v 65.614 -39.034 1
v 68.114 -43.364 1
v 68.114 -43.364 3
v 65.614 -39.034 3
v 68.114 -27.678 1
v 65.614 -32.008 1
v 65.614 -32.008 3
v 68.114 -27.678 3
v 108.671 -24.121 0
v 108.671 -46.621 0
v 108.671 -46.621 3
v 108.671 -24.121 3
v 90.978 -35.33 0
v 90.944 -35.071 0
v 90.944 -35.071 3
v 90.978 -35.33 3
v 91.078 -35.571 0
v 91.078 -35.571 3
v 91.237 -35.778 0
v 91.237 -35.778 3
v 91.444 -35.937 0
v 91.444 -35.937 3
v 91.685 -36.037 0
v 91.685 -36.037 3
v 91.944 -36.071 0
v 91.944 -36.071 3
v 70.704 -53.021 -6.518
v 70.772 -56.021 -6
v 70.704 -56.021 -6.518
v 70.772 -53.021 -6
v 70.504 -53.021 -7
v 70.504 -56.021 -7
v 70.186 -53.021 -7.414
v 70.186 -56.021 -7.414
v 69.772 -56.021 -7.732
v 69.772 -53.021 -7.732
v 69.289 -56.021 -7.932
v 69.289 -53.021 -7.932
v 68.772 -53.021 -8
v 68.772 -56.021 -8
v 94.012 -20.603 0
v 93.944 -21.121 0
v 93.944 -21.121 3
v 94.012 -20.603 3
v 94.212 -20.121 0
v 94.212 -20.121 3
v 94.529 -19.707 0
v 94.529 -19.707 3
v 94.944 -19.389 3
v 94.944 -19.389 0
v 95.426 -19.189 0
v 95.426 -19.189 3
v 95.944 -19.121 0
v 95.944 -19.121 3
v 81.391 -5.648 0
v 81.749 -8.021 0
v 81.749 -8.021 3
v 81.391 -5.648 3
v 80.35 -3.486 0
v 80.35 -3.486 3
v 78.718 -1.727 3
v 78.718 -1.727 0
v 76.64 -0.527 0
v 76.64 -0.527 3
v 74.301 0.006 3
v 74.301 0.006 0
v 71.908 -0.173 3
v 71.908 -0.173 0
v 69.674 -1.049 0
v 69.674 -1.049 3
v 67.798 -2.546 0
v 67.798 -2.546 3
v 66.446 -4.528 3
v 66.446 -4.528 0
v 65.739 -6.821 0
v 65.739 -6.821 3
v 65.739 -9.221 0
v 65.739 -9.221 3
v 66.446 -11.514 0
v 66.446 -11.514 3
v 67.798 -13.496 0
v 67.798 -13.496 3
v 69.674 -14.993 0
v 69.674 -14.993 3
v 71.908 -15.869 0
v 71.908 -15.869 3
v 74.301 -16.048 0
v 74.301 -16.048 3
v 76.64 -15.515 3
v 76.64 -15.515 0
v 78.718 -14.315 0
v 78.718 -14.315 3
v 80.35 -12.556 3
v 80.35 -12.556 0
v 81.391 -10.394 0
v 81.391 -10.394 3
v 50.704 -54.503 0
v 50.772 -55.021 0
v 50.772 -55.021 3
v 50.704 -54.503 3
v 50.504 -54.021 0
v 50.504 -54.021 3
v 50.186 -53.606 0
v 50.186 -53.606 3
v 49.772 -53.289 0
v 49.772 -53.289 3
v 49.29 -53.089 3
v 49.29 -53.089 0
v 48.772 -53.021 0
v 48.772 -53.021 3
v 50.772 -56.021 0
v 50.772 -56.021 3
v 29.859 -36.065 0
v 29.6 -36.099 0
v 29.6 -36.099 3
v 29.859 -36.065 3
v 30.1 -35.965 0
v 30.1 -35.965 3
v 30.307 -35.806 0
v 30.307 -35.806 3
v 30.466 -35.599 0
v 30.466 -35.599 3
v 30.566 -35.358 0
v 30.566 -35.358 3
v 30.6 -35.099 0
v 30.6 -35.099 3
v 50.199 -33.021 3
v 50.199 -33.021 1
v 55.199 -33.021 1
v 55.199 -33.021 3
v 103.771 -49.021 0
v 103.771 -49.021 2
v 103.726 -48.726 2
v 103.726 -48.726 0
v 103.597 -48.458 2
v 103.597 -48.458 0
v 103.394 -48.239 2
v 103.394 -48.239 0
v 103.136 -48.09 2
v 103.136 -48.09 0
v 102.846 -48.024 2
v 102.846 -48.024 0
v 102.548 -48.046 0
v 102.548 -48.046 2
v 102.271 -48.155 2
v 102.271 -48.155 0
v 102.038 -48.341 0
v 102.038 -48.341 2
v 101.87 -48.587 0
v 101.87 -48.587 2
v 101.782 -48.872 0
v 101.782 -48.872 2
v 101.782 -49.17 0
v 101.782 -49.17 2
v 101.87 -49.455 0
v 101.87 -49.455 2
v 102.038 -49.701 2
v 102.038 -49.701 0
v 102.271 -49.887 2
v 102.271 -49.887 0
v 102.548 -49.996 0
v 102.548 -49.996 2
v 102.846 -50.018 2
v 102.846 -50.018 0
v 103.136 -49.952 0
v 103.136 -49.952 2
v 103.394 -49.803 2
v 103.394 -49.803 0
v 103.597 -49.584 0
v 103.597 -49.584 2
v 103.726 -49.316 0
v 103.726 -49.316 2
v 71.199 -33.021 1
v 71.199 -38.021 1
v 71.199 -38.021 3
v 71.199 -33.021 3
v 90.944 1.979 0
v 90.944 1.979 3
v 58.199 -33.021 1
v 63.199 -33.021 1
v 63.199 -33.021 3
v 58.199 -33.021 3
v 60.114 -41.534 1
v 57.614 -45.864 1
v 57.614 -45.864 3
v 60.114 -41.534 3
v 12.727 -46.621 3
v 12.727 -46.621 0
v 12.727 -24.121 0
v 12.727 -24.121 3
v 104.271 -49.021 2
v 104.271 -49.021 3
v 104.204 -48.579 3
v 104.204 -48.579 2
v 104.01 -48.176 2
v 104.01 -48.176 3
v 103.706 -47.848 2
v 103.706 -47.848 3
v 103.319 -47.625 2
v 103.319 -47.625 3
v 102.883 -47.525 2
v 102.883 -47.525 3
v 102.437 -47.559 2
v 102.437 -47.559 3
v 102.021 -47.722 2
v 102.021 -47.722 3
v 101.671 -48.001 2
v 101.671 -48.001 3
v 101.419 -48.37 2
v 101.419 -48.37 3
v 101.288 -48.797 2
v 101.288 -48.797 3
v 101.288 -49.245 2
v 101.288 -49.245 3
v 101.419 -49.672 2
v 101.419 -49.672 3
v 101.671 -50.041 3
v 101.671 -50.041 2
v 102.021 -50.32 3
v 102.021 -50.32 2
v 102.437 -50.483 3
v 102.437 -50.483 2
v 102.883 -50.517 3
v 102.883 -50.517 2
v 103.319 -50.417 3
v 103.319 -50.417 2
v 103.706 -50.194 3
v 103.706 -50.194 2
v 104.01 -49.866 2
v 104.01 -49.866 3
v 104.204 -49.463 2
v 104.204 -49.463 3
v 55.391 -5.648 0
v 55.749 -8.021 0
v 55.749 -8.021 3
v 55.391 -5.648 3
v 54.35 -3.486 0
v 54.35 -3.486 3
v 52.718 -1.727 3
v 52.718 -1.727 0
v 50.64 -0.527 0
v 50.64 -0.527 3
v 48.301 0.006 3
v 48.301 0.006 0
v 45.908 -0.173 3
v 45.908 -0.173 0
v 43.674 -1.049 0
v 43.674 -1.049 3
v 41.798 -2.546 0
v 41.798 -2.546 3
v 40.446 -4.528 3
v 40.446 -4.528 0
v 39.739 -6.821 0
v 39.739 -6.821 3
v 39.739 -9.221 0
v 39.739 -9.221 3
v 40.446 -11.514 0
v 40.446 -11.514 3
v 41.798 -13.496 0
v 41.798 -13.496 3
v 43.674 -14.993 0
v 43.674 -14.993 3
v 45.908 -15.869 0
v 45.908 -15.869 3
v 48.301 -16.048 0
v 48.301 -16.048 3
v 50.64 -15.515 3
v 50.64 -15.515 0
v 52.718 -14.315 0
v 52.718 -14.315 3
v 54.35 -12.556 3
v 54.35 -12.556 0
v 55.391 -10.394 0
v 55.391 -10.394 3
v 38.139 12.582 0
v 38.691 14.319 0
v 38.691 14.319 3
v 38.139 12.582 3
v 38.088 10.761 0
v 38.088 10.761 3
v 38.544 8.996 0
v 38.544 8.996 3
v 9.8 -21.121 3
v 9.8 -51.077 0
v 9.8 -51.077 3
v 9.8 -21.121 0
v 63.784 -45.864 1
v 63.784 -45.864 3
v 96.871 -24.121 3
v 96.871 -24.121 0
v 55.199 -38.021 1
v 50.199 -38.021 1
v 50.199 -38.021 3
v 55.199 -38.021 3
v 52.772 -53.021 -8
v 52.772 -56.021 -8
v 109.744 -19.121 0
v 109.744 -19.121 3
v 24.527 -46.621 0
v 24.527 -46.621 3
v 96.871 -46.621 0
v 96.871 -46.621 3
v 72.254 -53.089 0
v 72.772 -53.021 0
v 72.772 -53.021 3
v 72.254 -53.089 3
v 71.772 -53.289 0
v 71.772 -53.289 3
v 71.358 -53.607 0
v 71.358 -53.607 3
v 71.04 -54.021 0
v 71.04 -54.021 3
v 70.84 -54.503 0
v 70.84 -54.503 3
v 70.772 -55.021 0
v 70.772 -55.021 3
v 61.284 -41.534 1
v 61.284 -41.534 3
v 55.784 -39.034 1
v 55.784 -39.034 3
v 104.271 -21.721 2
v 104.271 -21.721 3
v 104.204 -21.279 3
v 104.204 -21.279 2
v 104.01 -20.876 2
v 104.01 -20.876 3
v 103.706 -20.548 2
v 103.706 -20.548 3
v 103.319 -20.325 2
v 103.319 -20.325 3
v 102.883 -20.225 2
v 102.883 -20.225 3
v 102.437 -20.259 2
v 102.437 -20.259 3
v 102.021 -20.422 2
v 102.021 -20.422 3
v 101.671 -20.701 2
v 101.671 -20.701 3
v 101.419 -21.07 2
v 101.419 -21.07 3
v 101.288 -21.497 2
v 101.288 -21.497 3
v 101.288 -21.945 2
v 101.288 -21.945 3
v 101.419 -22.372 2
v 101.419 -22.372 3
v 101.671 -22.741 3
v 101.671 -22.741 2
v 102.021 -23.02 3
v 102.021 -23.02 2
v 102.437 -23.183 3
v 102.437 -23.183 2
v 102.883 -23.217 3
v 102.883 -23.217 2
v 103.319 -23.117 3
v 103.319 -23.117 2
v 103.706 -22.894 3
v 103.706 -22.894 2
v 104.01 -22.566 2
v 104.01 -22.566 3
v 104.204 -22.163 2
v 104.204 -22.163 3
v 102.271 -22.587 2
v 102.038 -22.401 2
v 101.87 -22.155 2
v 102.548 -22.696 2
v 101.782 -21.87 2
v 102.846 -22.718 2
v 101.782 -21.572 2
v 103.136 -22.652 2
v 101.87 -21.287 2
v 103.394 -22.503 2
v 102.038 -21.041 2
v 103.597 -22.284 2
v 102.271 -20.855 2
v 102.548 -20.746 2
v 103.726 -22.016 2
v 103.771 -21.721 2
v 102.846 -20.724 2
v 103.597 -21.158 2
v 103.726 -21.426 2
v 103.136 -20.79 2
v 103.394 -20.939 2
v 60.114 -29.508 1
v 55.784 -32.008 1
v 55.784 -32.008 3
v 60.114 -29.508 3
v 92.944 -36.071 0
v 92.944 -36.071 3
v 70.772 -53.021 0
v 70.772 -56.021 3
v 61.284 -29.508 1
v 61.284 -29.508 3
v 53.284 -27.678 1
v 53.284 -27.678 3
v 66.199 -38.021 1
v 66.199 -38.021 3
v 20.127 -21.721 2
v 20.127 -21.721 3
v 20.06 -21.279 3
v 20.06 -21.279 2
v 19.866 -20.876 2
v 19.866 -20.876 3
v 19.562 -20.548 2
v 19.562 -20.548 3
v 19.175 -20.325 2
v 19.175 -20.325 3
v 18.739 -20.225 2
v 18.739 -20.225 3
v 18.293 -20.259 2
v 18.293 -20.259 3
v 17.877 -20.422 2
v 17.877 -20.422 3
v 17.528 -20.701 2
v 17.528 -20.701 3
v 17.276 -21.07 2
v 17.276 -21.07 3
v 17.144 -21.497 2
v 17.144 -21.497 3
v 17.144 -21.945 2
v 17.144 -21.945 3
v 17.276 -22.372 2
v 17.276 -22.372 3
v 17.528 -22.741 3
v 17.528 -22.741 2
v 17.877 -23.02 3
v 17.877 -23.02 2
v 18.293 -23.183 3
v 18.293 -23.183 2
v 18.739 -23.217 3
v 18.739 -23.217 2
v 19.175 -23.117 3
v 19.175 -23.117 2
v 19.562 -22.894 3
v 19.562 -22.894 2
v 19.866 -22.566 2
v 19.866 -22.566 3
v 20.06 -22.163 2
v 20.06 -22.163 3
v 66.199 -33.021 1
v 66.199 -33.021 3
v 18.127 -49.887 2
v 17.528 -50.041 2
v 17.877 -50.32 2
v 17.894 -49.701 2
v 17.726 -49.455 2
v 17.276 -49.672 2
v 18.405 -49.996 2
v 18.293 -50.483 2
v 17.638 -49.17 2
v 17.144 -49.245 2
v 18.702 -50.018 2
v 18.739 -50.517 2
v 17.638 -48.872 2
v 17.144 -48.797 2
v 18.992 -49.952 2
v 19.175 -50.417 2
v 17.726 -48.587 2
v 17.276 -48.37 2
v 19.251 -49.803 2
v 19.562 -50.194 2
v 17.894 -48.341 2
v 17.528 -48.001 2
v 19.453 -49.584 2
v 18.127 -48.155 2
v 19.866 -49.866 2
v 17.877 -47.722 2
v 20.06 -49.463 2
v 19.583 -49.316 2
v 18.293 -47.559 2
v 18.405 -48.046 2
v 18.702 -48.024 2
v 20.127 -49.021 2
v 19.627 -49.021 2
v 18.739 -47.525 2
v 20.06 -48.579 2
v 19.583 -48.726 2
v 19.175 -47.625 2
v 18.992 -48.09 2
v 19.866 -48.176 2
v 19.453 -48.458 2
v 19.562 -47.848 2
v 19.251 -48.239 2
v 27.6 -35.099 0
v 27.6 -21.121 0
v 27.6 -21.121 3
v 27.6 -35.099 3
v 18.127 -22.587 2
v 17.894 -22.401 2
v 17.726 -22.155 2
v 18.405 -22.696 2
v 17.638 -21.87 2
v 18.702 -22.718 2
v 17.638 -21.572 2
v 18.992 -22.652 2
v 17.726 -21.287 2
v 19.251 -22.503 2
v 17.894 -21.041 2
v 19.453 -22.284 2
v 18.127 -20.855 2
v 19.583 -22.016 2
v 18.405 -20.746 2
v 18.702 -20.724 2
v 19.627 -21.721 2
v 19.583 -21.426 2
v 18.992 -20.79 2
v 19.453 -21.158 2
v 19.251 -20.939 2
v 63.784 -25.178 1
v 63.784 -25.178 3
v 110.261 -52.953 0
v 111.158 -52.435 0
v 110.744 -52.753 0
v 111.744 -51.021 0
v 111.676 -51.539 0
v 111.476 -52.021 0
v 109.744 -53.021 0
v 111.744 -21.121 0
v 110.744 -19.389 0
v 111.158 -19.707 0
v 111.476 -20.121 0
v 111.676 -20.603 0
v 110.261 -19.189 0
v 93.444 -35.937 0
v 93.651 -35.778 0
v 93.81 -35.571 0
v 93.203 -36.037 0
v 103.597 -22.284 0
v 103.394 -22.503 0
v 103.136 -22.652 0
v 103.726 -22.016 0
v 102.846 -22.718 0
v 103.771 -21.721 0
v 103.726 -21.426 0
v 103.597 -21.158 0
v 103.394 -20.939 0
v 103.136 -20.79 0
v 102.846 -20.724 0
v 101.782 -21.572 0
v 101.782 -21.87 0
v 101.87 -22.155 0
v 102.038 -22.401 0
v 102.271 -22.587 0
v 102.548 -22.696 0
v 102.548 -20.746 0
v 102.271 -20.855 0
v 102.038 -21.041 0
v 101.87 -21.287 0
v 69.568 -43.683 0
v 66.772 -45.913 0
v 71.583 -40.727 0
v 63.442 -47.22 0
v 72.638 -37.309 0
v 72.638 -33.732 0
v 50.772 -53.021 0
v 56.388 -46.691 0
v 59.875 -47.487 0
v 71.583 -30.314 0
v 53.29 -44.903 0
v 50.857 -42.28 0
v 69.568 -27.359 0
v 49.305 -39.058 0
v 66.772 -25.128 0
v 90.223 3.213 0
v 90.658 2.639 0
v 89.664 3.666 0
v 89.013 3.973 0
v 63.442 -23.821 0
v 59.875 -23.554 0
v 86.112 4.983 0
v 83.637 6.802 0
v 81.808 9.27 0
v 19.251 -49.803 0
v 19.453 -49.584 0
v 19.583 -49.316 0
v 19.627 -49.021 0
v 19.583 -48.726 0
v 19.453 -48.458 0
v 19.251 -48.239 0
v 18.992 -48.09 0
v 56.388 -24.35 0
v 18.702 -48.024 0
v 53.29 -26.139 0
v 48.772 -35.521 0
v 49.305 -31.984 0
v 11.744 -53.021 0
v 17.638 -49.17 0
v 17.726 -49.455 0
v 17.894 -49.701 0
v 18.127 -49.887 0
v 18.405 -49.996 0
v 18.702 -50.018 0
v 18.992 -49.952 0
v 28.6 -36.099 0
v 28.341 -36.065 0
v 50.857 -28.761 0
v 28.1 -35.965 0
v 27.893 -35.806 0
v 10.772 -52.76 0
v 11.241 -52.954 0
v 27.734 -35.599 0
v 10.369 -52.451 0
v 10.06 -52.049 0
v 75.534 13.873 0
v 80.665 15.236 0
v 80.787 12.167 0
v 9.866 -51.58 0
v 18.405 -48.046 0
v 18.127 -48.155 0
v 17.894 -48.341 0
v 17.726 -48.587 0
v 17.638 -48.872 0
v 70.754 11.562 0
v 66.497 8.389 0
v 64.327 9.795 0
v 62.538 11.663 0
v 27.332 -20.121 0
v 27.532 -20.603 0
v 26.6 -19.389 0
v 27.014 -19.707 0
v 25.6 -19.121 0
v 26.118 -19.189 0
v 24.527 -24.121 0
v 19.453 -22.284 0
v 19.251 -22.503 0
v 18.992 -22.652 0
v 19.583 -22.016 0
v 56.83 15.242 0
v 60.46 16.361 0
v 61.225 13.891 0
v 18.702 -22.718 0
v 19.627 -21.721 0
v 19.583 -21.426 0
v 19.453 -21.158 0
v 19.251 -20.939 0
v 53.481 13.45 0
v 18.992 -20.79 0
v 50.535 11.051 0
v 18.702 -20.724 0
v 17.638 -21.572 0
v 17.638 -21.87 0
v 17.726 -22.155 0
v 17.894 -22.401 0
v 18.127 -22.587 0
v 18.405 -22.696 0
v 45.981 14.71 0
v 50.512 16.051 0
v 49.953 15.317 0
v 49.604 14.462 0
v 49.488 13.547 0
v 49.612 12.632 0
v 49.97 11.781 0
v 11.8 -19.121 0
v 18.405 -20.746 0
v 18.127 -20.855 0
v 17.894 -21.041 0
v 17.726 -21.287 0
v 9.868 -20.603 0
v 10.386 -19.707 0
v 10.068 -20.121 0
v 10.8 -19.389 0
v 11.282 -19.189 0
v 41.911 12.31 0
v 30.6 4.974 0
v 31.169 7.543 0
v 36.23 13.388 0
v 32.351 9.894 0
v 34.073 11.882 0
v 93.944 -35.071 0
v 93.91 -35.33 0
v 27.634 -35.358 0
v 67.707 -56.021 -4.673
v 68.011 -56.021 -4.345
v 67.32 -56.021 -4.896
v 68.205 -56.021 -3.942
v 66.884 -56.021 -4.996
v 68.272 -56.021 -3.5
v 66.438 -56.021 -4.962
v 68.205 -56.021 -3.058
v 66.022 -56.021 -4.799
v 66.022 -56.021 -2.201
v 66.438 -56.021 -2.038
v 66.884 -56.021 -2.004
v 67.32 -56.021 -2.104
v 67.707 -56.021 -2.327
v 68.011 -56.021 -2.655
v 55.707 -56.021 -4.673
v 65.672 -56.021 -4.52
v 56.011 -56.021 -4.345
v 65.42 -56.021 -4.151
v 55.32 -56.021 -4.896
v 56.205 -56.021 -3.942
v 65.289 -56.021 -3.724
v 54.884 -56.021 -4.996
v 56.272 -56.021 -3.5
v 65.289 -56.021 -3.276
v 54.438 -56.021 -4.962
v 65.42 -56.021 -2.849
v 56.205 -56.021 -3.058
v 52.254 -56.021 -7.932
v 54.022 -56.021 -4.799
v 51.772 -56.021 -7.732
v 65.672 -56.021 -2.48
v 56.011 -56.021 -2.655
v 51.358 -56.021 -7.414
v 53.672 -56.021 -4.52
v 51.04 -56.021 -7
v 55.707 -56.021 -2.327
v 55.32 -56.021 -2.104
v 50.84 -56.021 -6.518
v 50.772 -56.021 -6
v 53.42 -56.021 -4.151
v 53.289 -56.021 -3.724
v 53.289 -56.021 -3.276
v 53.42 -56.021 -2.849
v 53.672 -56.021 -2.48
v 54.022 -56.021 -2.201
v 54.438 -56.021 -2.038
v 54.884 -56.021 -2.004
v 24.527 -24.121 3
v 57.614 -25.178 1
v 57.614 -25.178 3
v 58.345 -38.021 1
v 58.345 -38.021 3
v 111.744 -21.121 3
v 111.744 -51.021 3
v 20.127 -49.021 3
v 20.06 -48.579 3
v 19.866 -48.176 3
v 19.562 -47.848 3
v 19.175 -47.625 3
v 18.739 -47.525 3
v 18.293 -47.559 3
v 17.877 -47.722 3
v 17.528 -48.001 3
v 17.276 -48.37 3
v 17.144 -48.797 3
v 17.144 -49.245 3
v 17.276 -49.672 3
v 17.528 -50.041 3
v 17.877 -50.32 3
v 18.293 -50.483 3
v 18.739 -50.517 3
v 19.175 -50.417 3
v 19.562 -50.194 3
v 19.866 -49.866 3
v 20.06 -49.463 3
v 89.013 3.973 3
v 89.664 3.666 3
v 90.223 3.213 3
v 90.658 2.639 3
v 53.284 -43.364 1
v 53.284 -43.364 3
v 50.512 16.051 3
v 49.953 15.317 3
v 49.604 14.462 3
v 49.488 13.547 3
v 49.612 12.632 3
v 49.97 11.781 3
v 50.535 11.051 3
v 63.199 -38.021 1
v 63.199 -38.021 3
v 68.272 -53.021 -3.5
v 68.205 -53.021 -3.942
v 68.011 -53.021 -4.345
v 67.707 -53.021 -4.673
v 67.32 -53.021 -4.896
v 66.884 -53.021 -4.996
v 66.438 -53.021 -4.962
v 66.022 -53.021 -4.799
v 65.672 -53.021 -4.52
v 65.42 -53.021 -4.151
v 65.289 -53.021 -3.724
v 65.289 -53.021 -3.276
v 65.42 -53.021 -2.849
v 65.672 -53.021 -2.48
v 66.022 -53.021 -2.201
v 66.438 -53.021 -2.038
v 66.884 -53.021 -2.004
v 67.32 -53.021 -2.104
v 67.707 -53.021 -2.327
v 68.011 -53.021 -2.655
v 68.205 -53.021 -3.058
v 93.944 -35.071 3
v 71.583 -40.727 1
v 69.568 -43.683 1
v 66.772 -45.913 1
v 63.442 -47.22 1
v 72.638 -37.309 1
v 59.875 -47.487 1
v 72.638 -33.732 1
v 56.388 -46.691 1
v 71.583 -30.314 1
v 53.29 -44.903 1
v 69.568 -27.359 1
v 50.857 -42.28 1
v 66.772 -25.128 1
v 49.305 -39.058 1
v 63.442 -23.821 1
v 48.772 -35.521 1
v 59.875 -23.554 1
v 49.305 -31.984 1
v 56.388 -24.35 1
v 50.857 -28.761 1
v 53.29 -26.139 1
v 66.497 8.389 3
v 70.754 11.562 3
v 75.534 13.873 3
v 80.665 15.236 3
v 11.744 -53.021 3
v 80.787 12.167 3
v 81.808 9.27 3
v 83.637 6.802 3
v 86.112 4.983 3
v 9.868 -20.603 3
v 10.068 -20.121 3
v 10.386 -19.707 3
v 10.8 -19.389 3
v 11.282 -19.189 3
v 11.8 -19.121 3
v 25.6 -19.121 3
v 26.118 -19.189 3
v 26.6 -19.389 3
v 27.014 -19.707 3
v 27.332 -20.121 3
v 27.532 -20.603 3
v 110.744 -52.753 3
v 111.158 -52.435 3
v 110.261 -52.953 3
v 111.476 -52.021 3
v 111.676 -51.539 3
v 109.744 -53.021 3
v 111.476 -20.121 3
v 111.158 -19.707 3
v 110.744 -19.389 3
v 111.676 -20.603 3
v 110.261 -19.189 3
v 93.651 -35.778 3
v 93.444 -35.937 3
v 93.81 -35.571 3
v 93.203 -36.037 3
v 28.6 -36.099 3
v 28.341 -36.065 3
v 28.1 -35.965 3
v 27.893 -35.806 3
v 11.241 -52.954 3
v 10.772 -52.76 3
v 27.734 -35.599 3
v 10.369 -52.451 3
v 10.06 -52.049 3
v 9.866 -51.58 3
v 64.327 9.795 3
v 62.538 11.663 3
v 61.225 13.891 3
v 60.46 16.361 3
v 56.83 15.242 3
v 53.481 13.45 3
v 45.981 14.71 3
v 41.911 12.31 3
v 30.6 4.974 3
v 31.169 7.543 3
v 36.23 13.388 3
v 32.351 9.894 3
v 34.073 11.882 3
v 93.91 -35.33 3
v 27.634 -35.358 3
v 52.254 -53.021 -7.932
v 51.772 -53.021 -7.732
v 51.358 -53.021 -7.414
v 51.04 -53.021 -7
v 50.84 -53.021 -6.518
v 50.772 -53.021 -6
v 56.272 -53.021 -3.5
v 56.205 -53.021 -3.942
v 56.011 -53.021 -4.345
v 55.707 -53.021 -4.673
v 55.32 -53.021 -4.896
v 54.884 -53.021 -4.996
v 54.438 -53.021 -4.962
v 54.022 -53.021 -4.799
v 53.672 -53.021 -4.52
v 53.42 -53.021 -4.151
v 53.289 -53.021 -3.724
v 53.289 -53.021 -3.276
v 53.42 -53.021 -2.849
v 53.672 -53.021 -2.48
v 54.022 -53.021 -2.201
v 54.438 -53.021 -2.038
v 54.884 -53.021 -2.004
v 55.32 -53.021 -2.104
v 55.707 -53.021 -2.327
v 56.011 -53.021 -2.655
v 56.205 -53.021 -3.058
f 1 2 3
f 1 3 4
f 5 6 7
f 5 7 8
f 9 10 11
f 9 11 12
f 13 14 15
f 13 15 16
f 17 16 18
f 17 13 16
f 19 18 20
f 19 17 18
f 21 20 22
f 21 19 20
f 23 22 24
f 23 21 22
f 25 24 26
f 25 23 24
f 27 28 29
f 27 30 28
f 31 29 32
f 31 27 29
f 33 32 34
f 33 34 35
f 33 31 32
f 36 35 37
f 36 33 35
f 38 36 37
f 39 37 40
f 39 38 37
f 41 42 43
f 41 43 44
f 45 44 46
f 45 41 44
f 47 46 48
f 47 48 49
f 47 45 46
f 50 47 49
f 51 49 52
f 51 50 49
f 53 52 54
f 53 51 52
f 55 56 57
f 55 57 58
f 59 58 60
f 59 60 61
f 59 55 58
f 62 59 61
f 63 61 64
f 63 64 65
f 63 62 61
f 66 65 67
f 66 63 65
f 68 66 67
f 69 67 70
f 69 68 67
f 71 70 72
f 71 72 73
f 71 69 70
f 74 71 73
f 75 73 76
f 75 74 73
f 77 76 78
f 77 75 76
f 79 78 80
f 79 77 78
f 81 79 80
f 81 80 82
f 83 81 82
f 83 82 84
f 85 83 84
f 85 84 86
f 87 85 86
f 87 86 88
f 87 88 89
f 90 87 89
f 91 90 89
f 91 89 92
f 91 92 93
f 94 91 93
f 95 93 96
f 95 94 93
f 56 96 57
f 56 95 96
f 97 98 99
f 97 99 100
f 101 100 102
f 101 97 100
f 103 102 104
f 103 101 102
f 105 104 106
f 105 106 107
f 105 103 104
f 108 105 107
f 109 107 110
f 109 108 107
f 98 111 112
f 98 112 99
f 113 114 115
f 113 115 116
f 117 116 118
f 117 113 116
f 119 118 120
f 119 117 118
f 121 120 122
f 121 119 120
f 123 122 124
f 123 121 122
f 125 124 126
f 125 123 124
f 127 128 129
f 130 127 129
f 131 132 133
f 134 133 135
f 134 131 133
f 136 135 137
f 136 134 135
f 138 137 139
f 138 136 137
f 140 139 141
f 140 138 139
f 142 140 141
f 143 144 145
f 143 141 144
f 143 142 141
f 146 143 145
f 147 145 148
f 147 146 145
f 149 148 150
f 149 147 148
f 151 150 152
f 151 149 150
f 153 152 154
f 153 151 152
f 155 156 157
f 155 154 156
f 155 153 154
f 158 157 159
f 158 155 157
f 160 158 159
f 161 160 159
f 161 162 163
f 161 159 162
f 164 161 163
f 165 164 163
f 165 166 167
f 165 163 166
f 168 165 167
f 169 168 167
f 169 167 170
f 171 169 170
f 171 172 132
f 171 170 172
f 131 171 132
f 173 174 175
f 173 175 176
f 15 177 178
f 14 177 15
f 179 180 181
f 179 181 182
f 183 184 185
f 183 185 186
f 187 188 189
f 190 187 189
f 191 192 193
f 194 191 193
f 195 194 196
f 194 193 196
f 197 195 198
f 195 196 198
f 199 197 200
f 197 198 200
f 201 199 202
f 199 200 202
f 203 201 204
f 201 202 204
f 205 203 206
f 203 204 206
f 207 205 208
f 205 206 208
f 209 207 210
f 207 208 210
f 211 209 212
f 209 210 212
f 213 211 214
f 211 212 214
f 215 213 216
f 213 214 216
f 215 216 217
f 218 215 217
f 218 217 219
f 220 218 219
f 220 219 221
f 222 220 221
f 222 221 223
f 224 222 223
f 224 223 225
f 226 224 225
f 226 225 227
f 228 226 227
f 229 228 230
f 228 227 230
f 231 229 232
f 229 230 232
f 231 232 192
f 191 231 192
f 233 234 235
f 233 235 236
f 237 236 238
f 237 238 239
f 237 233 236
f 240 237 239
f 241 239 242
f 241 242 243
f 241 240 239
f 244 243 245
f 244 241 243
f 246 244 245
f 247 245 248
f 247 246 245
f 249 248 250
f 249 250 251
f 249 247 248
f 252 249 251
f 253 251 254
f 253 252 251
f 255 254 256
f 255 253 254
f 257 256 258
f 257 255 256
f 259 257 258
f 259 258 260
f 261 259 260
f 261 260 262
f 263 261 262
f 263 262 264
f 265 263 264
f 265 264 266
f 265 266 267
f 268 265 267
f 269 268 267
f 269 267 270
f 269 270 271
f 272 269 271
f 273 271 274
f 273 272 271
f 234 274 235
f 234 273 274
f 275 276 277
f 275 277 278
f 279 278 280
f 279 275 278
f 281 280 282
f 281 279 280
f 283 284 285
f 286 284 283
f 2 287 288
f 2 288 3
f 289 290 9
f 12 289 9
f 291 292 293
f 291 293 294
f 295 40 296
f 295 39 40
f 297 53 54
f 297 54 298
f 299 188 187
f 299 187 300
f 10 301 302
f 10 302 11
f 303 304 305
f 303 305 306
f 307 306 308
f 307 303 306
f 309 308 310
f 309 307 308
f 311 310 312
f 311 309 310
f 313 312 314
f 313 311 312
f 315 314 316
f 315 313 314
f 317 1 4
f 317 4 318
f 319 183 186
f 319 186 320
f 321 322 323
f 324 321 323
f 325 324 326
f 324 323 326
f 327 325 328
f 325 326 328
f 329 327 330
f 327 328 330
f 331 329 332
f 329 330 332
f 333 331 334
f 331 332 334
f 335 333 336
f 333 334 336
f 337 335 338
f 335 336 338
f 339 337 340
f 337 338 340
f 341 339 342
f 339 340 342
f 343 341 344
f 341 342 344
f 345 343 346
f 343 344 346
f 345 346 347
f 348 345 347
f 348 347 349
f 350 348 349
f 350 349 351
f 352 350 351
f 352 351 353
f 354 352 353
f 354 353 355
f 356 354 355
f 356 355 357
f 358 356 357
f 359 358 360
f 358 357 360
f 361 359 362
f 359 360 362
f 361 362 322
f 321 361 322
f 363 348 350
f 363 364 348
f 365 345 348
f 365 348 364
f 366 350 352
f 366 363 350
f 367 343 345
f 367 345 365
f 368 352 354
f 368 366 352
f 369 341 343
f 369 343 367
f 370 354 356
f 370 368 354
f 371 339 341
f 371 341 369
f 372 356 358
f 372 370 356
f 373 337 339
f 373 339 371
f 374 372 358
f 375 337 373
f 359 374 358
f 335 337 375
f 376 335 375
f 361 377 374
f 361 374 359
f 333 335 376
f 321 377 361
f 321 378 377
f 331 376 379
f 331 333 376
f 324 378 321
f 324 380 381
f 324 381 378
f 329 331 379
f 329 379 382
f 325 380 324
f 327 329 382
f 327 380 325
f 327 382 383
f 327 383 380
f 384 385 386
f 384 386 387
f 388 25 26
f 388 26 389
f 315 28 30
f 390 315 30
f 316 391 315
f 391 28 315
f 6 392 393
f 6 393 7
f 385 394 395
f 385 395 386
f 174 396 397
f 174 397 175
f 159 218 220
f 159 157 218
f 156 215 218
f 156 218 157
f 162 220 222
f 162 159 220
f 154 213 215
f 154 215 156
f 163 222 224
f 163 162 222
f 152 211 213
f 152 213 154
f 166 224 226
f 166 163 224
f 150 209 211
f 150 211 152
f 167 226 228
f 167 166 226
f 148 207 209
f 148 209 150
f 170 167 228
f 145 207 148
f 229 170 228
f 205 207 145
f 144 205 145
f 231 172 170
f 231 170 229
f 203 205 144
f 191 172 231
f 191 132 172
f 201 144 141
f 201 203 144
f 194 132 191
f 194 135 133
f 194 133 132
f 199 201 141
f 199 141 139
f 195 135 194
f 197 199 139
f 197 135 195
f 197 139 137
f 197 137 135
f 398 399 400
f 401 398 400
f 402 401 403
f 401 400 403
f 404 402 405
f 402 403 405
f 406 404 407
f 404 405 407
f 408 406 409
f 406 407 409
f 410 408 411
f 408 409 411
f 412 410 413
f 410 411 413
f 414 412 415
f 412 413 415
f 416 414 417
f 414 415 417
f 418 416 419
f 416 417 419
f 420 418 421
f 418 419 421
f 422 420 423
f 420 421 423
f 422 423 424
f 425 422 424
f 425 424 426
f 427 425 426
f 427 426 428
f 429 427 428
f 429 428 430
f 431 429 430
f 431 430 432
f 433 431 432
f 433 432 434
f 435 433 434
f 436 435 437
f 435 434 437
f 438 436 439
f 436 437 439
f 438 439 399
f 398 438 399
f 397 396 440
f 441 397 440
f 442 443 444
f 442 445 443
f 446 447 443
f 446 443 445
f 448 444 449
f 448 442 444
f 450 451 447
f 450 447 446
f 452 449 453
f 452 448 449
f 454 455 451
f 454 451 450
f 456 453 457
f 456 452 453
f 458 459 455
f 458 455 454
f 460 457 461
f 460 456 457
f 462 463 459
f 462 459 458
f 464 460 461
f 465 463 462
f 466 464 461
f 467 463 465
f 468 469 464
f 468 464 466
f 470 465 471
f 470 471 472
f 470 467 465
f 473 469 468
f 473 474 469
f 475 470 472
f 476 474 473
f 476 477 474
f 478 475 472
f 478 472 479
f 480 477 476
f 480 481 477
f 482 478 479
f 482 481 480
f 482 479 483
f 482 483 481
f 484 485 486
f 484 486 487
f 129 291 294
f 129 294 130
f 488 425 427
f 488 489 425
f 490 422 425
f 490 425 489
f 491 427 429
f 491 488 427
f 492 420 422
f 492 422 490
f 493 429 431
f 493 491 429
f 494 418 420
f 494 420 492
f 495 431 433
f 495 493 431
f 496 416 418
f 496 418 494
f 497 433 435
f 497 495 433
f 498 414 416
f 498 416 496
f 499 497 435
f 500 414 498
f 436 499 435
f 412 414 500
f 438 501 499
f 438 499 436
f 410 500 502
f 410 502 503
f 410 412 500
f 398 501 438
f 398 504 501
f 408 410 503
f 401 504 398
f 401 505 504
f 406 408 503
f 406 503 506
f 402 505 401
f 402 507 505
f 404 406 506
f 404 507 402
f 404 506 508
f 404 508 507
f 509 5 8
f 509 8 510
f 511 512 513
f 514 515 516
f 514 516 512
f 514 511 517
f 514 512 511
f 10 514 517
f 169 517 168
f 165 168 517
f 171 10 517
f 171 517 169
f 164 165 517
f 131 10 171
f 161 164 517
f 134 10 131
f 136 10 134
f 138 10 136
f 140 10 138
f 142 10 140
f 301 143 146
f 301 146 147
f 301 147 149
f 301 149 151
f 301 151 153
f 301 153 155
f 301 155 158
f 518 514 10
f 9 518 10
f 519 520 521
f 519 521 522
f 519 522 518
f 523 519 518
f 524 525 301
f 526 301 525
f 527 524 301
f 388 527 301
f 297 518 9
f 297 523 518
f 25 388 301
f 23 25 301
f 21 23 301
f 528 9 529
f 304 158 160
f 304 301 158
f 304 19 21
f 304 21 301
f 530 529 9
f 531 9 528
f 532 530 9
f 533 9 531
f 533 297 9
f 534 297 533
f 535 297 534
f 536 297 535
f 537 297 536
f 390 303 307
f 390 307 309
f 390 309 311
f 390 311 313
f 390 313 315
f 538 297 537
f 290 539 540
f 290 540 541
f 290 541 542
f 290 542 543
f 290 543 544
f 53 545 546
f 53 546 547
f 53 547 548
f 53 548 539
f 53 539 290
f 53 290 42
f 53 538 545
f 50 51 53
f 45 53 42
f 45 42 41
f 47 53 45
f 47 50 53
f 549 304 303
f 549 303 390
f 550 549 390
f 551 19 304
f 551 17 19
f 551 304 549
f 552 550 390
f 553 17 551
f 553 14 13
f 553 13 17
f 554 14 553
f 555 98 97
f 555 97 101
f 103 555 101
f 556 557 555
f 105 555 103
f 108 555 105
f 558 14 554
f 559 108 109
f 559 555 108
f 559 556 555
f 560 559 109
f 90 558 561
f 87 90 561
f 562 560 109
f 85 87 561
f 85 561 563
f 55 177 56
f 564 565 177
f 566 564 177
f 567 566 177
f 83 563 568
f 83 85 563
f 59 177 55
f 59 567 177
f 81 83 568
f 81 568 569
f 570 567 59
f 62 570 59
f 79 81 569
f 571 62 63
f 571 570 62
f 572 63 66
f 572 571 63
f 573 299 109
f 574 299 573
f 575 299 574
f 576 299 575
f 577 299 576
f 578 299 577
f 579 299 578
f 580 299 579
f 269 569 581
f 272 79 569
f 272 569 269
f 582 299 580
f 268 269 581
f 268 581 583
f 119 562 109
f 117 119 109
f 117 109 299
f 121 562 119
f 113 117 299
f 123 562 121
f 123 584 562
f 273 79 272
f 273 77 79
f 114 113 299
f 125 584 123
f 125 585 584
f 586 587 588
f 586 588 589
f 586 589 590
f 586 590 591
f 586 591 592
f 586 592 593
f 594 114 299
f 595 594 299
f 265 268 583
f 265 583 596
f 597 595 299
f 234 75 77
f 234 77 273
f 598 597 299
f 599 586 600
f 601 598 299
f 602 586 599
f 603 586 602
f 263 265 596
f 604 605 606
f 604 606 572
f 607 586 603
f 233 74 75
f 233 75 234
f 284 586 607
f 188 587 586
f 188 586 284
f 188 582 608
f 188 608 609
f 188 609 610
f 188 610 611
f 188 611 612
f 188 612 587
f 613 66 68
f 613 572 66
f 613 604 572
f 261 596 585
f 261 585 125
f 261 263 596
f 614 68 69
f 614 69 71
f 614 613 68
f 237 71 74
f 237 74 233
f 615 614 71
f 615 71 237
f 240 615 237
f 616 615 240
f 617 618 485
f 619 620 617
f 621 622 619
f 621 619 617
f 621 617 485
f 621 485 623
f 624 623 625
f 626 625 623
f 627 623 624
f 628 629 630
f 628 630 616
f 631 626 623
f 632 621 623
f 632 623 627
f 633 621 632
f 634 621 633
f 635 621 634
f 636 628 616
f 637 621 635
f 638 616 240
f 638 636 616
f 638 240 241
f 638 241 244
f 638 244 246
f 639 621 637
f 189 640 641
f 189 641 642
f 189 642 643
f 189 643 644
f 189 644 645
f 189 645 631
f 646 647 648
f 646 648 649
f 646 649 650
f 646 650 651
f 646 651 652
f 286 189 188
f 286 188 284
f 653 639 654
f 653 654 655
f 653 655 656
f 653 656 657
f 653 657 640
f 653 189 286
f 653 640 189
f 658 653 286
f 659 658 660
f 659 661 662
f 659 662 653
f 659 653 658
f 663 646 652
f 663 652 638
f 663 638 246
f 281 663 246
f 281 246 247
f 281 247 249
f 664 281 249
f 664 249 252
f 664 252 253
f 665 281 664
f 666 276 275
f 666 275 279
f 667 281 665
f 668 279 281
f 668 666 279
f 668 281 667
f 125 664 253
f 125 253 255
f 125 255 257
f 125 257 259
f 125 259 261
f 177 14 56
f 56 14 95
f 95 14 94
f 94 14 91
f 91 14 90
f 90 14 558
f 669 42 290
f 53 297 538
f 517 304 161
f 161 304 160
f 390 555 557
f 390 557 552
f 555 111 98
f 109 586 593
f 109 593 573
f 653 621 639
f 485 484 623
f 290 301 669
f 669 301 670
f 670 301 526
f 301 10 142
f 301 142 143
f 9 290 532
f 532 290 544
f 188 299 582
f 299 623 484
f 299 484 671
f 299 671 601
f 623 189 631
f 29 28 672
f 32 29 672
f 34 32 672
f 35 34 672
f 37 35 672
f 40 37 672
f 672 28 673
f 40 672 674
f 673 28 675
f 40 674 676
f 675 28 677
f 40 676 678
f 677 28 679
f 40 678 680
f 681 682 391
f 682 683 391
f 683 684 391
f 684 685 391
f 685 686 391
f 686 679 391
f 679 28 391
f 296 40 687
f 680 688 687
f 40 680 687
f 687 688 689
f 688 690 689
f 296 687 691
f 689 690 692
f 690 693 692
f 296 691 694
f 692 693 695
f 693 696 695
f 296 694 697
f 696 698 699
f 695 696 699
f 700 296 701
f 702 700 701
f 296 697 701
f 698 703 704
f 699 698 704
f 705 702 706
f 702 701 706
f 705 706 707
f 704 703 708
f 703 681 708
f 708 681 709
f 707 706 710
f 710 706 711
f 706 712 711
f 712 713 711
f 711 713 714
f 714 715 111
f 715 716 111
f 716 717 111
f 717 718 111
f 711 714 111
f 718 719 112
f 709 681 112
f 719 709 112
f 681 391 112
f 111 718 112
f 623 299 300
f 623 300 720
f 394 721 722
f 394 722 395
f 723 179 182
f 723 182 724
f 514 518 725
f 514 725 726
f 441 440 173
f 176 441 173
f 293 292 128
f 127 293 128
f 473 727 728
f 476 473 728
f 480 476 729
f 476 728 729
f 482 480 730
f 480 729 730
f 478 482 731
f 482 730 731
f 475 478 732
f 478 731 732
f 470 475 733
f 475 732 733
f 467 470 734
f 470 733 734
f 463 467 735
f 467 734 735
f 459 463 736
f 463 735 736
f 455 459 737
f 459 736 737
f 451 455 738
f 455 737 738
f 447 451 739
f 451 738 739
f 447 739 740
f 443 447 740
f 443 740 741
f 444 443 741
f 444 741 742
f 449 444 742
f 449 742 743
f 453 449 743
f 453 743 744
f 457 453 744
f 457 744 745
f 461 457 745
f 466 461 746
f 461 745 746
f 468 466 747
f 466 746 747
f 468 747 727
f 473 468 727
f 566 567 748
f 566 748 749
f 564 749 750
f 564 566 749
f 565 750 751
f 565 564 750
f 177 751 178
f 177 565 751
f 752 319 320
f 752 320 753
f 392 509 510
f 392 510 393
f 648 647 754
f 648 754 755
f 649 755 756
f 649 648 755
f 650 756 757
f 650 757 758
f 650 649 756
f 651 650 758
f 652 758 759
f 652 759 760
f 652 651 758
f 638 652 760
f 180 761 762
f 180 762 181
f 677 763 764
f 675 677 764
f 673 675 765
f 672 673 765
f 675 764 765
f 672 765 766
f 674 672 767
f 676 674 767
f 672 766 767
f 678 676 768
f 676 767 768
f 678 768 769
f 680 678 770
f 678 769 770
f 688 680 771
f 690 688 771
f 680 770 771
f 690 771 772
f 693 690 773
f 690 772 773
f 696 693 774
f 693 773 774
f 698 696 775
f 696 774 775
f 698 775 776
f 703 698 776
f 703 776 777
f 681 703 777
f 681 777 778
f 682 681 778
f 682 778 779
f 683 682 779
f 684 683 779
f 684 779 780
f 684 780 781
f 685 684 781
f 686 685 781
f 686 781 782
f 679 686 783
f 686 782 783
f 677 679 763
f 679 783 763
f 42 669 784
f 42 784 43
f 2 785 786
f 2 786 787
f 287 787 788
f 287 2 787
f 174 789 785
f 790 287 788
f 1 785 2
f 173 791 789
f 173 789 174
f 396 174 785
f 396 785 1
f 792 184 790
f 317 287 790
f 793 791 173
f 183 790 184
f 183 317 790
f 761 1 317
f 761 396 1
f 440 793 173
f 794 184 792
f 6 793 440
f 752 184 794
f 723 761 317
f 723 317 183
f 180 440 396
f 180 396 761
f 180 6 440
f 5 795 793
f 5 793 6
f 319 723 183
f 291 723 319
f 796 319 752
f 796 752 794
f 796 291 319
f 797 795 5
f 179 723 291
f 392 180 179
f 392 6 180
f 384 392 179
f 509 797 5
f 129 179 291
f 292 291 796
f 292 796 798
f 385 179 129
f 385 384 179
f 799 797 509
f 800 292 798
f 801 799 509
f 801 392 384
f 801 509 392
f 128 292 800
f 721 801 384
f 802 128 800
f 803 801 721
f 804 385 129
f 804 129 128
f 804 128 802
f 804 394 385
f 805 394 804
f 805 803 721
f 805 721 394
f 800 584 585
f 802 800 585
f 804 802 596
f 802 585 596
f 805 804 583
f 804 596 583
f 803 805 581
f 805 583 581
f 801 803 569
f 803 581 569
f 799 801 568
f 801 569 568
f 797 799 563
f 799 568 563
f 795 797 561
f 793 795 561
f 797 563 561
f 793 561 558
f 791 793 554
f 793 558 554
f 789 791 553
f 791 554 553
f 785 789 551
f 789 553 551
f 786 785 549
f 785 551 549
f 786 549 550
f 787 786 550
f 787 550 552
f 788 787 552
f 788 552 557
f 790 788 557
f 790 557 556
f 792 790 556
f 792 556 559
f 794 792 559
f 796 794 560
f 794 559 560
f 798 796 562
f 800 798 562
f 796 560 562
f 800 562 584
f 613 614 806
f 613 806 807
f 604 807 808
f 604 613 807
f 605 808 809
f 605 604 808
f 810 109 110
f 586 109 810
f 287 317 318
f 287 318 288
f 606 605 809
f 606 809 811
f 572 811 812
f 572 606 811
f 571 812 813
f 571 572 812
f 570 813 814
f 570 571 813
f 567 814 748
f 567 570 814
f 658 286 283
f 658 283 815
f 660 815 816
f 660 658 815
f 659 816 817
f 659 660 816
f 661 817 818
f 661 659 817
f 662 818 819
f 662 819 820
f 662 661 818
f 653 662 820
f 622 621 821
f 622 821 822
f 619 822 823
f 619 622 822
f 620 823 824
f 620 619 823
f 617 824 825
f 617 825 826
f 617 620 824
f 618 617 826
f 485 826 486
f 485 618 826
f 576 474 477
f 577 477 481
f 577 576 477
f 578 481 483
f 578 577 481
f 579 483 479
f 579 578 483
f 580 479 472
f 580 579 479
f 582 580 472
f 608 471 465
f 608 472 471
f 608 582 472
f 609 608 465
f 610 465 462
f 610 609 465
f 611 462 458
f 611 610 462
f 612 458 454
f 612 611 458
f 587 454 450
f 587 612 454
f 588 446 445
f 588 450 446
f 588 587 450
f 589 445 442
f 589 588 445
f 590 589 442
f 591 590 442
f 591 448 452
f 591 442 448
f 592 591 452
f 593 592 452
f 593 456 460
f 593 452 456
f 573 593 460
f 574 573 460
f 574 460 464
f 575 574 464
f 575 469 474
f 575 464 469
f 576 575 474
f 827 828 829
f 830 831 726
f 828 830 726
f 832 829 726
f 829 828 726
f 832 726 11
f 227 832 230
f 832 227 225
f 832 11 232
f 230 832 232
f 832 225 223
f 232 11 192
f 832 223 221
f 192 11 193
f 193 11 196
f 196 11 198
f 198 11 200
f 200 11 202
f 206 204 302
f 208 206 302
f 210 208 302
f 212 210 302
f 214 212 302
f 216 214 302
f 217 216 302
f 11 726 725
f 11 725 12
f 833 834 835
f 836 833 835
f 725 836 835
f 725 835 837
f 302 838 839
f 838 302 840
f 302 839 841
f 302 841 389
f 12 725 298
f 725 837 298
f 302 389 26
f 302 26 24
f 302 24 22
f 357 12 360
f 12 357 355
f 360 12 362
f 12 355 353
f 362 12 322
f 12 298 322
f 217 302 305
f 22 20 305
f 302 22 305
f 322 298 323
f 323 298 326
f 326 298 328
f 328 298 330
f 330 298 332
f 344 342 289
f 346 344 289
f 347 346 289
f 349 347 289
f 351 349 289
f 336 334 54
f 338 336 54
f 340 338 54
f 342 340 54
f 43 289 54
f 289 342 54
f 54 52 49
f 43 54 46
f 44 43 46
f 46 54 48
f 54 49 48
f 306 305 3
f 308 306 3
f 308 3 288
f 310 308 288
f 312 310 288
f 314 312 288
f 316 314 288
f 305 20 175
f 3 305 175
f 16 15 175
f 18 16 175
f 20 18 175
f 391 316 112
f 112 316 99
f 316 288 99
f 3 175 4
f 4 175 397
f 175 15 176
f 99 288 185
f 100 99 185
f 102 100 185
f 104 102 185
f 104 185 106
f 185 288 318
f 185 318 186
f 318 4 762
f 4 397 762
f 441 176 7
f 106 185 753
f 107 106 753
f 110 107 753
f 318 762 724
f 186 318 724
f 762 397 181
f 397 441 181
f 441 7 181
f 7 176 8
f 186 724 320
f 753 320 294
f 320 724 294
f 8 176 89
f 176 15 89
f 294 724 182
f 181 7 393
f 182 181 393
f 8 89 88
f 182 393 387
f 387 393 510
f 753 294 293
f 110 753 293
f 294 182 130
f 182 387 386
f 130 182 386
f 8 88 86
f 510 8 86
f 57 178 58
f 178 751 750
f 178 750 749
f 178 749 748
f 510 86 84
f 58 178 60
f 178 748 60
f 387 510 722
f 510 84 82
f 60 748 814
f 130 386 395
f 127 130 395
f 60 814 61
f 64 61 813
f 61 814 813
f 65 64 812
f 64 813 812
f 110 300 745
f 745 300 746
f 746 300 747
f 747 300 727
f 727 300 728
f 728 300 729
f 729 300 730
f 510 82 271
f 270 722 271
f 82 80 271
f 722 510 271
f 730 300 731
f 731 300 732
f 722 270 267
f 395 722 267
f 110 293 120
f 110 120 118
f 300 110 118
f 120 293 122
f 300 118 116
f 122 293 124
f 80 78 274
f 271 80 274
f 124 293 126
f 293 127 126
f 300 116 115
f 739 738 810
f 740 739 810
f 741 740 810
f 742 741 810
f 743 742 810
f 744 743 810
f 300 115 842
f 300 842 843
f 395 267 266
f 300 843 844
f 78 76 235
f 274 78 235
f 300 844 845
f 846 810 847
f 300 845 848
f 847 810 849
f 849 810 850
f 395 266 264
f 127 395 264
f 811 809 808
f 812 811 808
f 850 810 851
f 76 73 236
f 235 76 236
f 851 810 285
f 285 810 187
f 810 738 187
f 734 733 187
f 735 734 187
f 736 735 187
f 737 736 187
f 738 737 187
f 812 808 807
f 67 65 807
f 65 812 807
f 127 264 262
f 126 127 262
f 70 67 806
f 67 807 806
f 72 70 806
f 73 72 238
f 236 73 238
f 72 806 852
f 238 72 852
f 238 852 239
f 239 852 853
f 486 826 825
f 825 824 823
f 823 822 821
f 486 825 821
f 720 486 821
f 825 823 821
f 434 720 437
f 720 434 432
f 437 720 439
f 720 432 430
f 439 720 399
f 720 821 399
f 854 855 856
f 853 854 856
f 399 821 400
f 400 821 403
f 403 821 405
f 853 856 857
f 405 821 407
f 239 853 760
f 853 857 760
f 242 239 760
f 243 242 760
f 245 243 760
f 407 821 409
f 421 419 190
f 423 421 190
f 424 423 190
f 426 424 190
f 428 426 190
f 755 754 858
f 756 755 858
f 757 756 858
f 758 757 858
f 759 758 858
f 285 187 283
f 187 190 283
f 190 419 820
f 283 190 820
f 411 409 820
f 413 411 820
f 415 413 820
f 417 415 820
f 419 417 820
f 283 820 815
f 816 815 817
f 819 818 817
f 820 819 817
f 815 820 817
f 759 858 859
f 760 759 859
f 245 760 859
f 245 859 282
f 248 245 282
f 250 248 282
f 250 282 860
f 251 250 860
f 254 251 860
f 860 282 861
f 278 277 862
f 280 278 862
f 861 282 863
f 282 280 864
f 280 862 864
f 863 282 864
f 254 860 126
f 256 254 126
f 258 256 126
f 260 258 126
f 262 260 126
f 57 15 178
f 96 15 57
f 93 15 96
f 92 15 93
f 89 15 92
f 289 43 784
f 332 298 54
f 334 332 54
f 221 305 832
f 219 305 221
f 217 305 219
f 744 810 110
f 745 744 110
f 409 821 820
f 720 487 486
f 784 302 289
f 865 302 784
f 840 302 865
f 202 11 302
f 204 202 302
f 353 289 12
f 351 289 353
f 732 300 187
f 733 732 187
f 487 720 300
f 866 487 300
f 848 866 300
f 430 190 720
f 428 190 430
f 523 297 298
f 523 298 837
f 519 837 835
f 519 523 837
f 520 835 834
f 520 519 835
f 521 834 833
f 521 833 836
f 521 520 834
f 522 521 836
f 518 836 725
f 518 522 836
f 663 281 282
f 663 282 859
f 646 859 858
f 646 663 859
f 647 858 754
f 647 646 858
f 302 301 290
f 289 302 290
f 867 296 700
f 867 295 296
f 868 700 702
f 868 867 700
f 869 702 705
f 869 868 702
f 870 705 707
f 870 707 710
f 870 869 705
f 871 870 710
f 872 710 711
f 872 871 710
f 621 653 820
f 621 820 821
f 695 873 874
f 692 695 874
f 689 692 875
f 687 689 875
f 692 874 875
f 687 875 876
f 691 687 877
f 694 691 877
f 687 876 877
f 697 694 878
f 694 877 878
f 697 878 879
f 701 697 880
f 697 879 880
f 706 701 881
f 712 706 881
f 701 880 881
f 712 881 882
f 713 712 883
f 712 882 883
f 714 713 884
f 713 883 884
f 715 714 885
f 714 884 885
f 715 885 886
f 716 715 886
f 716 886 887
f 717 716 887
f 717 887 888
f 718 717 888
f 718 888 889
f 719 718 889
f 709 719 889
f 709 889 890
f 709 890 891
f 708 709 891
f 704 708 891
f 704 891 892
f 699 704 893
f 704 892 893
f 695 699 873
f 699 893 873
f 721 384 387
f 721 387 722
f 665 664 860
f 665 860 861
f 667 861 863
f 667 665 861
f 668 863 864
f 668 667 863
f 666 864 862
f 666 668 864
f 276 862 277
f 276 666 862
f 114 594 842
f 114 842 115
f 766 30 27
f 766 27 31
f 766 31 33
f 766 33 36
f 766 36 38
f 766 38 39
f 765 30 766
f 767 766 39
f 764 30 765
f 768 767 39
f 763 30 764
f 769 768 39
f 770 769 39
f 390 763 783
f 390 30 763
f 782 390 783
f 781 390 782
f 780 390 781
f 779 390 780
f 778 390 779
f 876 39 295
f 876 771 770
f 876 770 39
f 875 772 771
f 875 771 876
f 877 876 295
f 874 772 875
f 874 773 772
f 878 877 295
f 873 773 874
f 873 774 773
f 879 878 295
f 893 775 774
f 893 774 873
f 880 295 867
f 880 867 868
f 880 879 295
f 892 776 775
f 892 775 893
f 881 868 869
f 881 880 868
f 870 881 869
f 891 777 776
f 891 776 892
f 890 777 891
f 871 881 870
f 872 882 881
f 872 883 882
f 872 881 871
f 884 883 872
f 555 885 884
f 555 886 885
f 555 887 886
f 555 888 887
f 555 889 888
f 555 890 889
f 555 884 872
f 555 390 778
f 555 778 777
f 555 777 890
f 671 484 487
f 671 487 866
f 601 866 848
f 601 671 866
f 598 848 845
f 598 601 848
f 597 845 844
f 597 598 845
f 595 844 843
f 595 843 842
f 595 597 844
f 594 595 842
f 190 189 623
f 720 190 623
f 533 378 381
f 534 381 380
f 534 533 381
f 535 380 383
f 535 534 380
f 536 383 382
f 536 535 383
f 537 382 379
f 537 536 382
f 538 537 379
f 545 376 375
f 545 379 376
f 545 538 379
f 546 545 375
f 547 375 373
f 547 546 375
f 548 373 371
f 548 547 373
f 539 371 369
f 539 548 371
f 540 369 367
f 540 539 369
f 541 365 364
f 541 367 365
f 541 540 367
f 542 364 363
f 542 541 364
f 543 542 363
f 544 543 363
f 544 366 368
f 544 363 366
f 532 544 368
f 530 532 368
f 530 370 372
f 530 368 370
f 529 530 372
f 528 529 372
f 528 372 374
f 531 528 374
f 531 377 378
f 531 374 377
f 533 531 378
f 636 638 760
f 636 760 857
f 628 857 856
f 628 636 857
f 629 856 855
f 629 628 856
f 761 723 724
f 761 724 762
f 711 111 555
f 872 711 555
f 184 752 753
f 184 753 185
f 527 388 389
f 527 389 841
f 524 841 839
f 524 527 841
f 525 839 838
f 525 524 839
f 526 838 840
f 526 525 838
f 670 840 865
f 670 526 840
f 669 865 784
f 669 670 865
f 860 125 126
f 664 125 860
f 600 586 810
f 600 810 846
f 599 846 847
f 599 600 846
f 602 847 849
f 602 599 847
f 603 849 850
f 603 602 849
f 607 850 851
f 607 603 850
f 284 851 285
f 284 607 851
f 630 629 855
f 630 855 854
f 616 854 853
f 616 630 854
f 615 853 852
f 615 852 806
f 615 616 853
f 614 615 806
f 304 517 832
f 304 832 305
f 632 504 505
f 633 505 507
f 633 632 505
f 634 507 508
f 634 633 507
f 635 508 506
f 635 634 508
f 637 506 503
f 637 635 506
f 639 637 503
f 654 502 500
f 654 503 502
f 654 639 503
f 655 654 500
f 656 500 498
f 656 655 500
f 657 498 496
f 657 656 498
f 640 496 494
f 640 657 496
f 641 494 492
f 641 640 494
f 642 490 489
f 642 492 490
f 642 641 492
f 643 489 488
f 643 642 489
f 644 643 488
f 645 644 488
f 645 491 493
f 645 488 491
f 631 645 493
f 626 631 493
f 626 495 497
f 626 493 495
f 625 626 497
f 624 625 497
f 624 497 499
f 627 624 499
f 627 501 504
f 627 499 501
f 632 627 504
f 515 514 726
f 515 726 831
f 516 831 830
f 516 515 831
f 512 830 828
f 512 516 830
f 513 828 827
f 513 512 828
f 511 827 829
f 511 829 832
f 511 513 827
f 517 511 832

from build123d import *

# Parameters (mm, degrees)
MODEL_R                 = 8.05
MODEL_R_2               = 1
MODEL_W                 = 5
MODEL_H                 = 5
MODEL_W_2               = 11.8
MODEL_H_2               = 22.5
SALIENTE_EXTRUIR1_DEPTH = 3
CROQUIS2_R              = 1.5
CORTAR_EXTRUIR1_DEPTH   = 1
CROQUIS4_W              = 19.999967436
CROQUIS4_H              = 3
SALIENTE_EXTRUIR2_DEPTH = 8
CROQUIS5_R              = 1.5
CORTAR_EXTRUIR2_DEPTH   = 3
REDONDEO1_R             = 2
CROQUIS6_R              = 12
CORTAR_EXTRUIR3_DEPTH   = 1


with BuildPart() as part:
    # Model → Saliente-Extruir1 (new body)
    with BuildSketch(Plane.XY):
        with BuildLine():
            Line((28.600020379, -36.098945331), (29.600020379, -36.098945331))
            ThreePointArc((29.600020379, -36.098945331), (30.307127161, -35.806052112), (30.600020379, -35.098945331))
            Line((30.600020379, -35.098945331), (30.600020379, 4.974420659))
            ThreePointArc((30.600020379, 4.974420659), (33.150320304, 10.94136051), (38.69115159, 14.318872844))
            ThreePointArc((38.69115159, 14.318872844), (38.049426695, 11.673196605), (38.544127303, 8.99613013))
            ThreePointArc((38.544127303, 8.99613013), (43.872924224, 13.634815248), (50.51172433, 16.051385009))
            ThreePointArc((50.51172433, 16.051385009), (49.487728366, 13.546636971), (50.534778199, 11.051438157))
            ThreePointArc((50.534778199, 11.051438157), (55.112285588, 14.426569266), (60.460332405, 16.361376528))
            ThreePointArc((60.460332405, 16.361376528), (62.537747107, 11.66270114), (66.497154818, 8.389126209))
            ThreePointArc((66.497154818, 8.389126209), (73.089038309, 12.831206377), (80.665288642, 15.236499516))
            ThreePointArc((80.665288642, 15.236499516), (82.62970299, 7.967186508), (89.013428278, 3.973455574))
            ThreePointArc((89.013428278, 3.973455574), (90.223089011, 3.212884764), (90.943701038, 1.979002536))
            Line((90.943701038, 1.979002536), (90.943701038, -35.070997464))
            ThreePointArc((90.943701038, -35.070997464), (91.236594257, -35.778104245), (91.943701038, -36.070997464))
            Line((91.943701038, -36.070997464), (92.943701038, -36.070997464))
            ThreePointArc((92.943701038, -36.070997464), (93.650807819, -35.778104245), (93.943701038, -35.070997464))
            Line((93.943701038, -35.070997464), (93.943701038, -21.120997464))
            ThreePointArc((93.943701038, -21.120997464), (94.529487475, -19.706783901), (95.943701038, -19.120997464))
            Line((95.943701038, -19.120997464), (109.743701038, -19.120997464))
            ThreePointArc((109.743701038, -19.120997464), (111.1579146, -19.706783901), (111.743701038, -21.120997464))
            Line((111.743701038, -21.120997464), (111.743701038, -51.020997464))
            ThreePointArc((111.743701038, -51.020997464), (111.1579146, -52.435211026), (109.743701038, -53.020997464))
            Line((109.743701038, -53.020997464), (72.771860709, -53.020997464))
            ThreePointArc((72.771860709, -53.020997464), (71.357647146, -53.606783901), (70.771860709, -55.020997464))
            Line((70.771860709, -55.020997464), (70.771860709, -56.020573856))
            Line((70.771860709, -56.020573856), (50.771893273, -56.020573856))
            Line((50.771893273, -56.020573856), (50.771882418, -55.020552149))
            ThreePointArc((50.771882418, -55.020552149), (50.186088306, -53.606352619), (48.771882419, -53.020573857))
            Line((48.771882419, -53.020573857), (11.743679941, -53.020573857))
            ThreePointArc((11.743679941, -53.020573857), (10.369303805, -52.451275514), (9.800020379, -51.076893199))
            Line((9.800020379, -51.076893199), (9.800020379, -21.120997464))
            ThreePointArc((9.800020379, -21.120997464), (10.385806817, -19.706783901), (11.800020379, -19.120997464))
            Line((11.800020379, -19.120997464), (25.600020379, -19.120997464))
            ThreePointArc((25.600020379, -19.120997464), (27.014233942, -19.706783901), (27.600020379, -21.120997464))
            Line((27.600020379, -21.120997464), (27.600020379, -35.098945331))
            ThreePointArc((27.600020379, -35.098945331), (27.892913598, -35.806052112), (28.600020379, -36.098945331))
        make_face()
        with Locations((47.698959583, -8.020997464)):
            Circle(MODEL_R, mode=Mode.SUBTRACT)
        with Locations((73.698959582, -8.020997464)):
            Circle(MODEL_R, mode=Mode.SUBTRACT)
        with Locations((102.770799912, -49.020997464)):
            Circle(MODEL_R_2, mode=Mode.SUBTRACT)
        with Locations((102.770799912, -21.720997464)):
            Circle(MODEL_R_2, mode=Mode.SUBTRACT)
        with Locations((18.627119253, -49.020997464)):
            Circle(MODEL_R_2, mode=Mode.SUBTRACT)
        with Locations((18.627119253, -21.720997464)):
            Circle(MODEL_R_2, mode=Mode.SUBTRACT)
        Polygon((53.283896073, -43.364264203), (57.614023092, -45.864264203), (60.114023092, -41.534137185), (55.783896073, -39.034137185), align=None, mode=Mode.SUBTRACT)
        Polygon((63.783896073, -45.864264204), (68.114023092, -43.364264204), (65.614023092, -39.034137185), (61.283896073, -41.534137185), align=None, mode=Mode.SUBTRACT)
        with Locations((68.698959582, -35.520997464)):
            Rectangle(MODEL_W, MODEL_H, mode=Mode.SUBTRACT)
        Polygon((68.114023092, -27.677730724), (63.783896073, -25.177730724), (61.283896073, -29.507857743), (65.614023092, -32.007857743), align=None, mode=Mode.SUBTRACT)
        Polygon((57.614023092, -25.177730724), (53.283896073, -27.677730724), (55.783896073, -32.007857743), (60.114023092, -29.507857743), align=None, mode=Mode.SUBTRACT)
        with Locations((52.698959582, -35.520997464)):
            Rectangle(MODEL_W, MODEL_H, mode=Mode.SUBTRACT)
        Polygon((58.198975864, -33.020997464), (58.344778117, -38.020997464), (63.198975864, -38.020997464), (63.198975864, -33.020997464), align=None, mode=Mode.SUBTRACT)
        with Locations((102.770799912, -35.370997464)):
            Rectangle(MODEL_W_2, MODEL_H_2, mode=Mode.SUBTRACT)
        with Locations((18.627119253, -35.370997464)):
            Rectangle(MODEL_W_2, MODEL_H_2, mode=Mode.SUBTRACT)
    extrude(amount=SALIENTE_EXTRUIR1_DEPTH)

    # Croquis2 → Cortar-Extruir1 (cut)
    with BuildSketch(Plane.XY.offset(3)):
        with Locations((18.627119253, -21.720997464)):
            Circle(CROQUIS2_R)
        with Locations((18.627119253, -49.020997464)):
            Circle(CROQUIS2_R)
        with Locations((102.770799912, -49.020997464)):
            Circle(CROQUIS2_R)
        with Locations((102.770799912, -21.720997464)):
            Circle(CROQUIS2_R)
    extrude(amount=-CORTAR_EXTRUIR1_DEPTH, mode=Mode.SUBTRACT)

    # Croquis4 → Saliente-Extruir2 (add)
    with BuildSketch(Plane(origin=(0, 0, 0), x_dir=(-1, 0, 0), z_dir=(0, 0, -1))):
        with Locations((-60.771876991, -54.520573856)):
            Rectangle(CROQUIS4_W, CROQUIS4_H)
    extrude(amount=SALIENTE_EXTRUIR2_DEPTH)

    # Croquis5 → Cortar-Extruir2 (cut)
    with BuildSketch(Plane(origin=(0, -53.020573856, 0), x_dir=(1, 0, 0), z_dir=(0, 1, 0))):
        with Locations((66.771876991, 3.5)):
            Circle(CROQUIS5_R)
        with Locations((54.771876991, 3.5)):
            Circle(CROQUIS5_R)
    extrude(amount=-CORTAR_EXTRUIR2_DEPTH, mode=Mode.SUBTRACT)

    # Redondeo1
    redondeo1_edges = [part.edges().sort_by_distance(p)[0] for p in [
        (50.771893273, -54.520573856, -8),
        (70.771860709, -54.520573856, -8),
    ]]
    fillet(redondeo1_edges, radius=REDONDEO1_R)

    # Croquis6 → Cortar-Extruir3 (cut)
    with BuildSketch(Plane(origin=(0, 0, 0), x_dir=(-1, 0, 0), z_dir=(0, 0, -1))):
        with Locations((-60.771860709, -35.520573857)):
            Circle(CROQUIS6_R)
    extrude(amount=-CORTAR_EXTRUIR3_DEPTH, mode=Mode.SUBTRACT)


solid = part.part
